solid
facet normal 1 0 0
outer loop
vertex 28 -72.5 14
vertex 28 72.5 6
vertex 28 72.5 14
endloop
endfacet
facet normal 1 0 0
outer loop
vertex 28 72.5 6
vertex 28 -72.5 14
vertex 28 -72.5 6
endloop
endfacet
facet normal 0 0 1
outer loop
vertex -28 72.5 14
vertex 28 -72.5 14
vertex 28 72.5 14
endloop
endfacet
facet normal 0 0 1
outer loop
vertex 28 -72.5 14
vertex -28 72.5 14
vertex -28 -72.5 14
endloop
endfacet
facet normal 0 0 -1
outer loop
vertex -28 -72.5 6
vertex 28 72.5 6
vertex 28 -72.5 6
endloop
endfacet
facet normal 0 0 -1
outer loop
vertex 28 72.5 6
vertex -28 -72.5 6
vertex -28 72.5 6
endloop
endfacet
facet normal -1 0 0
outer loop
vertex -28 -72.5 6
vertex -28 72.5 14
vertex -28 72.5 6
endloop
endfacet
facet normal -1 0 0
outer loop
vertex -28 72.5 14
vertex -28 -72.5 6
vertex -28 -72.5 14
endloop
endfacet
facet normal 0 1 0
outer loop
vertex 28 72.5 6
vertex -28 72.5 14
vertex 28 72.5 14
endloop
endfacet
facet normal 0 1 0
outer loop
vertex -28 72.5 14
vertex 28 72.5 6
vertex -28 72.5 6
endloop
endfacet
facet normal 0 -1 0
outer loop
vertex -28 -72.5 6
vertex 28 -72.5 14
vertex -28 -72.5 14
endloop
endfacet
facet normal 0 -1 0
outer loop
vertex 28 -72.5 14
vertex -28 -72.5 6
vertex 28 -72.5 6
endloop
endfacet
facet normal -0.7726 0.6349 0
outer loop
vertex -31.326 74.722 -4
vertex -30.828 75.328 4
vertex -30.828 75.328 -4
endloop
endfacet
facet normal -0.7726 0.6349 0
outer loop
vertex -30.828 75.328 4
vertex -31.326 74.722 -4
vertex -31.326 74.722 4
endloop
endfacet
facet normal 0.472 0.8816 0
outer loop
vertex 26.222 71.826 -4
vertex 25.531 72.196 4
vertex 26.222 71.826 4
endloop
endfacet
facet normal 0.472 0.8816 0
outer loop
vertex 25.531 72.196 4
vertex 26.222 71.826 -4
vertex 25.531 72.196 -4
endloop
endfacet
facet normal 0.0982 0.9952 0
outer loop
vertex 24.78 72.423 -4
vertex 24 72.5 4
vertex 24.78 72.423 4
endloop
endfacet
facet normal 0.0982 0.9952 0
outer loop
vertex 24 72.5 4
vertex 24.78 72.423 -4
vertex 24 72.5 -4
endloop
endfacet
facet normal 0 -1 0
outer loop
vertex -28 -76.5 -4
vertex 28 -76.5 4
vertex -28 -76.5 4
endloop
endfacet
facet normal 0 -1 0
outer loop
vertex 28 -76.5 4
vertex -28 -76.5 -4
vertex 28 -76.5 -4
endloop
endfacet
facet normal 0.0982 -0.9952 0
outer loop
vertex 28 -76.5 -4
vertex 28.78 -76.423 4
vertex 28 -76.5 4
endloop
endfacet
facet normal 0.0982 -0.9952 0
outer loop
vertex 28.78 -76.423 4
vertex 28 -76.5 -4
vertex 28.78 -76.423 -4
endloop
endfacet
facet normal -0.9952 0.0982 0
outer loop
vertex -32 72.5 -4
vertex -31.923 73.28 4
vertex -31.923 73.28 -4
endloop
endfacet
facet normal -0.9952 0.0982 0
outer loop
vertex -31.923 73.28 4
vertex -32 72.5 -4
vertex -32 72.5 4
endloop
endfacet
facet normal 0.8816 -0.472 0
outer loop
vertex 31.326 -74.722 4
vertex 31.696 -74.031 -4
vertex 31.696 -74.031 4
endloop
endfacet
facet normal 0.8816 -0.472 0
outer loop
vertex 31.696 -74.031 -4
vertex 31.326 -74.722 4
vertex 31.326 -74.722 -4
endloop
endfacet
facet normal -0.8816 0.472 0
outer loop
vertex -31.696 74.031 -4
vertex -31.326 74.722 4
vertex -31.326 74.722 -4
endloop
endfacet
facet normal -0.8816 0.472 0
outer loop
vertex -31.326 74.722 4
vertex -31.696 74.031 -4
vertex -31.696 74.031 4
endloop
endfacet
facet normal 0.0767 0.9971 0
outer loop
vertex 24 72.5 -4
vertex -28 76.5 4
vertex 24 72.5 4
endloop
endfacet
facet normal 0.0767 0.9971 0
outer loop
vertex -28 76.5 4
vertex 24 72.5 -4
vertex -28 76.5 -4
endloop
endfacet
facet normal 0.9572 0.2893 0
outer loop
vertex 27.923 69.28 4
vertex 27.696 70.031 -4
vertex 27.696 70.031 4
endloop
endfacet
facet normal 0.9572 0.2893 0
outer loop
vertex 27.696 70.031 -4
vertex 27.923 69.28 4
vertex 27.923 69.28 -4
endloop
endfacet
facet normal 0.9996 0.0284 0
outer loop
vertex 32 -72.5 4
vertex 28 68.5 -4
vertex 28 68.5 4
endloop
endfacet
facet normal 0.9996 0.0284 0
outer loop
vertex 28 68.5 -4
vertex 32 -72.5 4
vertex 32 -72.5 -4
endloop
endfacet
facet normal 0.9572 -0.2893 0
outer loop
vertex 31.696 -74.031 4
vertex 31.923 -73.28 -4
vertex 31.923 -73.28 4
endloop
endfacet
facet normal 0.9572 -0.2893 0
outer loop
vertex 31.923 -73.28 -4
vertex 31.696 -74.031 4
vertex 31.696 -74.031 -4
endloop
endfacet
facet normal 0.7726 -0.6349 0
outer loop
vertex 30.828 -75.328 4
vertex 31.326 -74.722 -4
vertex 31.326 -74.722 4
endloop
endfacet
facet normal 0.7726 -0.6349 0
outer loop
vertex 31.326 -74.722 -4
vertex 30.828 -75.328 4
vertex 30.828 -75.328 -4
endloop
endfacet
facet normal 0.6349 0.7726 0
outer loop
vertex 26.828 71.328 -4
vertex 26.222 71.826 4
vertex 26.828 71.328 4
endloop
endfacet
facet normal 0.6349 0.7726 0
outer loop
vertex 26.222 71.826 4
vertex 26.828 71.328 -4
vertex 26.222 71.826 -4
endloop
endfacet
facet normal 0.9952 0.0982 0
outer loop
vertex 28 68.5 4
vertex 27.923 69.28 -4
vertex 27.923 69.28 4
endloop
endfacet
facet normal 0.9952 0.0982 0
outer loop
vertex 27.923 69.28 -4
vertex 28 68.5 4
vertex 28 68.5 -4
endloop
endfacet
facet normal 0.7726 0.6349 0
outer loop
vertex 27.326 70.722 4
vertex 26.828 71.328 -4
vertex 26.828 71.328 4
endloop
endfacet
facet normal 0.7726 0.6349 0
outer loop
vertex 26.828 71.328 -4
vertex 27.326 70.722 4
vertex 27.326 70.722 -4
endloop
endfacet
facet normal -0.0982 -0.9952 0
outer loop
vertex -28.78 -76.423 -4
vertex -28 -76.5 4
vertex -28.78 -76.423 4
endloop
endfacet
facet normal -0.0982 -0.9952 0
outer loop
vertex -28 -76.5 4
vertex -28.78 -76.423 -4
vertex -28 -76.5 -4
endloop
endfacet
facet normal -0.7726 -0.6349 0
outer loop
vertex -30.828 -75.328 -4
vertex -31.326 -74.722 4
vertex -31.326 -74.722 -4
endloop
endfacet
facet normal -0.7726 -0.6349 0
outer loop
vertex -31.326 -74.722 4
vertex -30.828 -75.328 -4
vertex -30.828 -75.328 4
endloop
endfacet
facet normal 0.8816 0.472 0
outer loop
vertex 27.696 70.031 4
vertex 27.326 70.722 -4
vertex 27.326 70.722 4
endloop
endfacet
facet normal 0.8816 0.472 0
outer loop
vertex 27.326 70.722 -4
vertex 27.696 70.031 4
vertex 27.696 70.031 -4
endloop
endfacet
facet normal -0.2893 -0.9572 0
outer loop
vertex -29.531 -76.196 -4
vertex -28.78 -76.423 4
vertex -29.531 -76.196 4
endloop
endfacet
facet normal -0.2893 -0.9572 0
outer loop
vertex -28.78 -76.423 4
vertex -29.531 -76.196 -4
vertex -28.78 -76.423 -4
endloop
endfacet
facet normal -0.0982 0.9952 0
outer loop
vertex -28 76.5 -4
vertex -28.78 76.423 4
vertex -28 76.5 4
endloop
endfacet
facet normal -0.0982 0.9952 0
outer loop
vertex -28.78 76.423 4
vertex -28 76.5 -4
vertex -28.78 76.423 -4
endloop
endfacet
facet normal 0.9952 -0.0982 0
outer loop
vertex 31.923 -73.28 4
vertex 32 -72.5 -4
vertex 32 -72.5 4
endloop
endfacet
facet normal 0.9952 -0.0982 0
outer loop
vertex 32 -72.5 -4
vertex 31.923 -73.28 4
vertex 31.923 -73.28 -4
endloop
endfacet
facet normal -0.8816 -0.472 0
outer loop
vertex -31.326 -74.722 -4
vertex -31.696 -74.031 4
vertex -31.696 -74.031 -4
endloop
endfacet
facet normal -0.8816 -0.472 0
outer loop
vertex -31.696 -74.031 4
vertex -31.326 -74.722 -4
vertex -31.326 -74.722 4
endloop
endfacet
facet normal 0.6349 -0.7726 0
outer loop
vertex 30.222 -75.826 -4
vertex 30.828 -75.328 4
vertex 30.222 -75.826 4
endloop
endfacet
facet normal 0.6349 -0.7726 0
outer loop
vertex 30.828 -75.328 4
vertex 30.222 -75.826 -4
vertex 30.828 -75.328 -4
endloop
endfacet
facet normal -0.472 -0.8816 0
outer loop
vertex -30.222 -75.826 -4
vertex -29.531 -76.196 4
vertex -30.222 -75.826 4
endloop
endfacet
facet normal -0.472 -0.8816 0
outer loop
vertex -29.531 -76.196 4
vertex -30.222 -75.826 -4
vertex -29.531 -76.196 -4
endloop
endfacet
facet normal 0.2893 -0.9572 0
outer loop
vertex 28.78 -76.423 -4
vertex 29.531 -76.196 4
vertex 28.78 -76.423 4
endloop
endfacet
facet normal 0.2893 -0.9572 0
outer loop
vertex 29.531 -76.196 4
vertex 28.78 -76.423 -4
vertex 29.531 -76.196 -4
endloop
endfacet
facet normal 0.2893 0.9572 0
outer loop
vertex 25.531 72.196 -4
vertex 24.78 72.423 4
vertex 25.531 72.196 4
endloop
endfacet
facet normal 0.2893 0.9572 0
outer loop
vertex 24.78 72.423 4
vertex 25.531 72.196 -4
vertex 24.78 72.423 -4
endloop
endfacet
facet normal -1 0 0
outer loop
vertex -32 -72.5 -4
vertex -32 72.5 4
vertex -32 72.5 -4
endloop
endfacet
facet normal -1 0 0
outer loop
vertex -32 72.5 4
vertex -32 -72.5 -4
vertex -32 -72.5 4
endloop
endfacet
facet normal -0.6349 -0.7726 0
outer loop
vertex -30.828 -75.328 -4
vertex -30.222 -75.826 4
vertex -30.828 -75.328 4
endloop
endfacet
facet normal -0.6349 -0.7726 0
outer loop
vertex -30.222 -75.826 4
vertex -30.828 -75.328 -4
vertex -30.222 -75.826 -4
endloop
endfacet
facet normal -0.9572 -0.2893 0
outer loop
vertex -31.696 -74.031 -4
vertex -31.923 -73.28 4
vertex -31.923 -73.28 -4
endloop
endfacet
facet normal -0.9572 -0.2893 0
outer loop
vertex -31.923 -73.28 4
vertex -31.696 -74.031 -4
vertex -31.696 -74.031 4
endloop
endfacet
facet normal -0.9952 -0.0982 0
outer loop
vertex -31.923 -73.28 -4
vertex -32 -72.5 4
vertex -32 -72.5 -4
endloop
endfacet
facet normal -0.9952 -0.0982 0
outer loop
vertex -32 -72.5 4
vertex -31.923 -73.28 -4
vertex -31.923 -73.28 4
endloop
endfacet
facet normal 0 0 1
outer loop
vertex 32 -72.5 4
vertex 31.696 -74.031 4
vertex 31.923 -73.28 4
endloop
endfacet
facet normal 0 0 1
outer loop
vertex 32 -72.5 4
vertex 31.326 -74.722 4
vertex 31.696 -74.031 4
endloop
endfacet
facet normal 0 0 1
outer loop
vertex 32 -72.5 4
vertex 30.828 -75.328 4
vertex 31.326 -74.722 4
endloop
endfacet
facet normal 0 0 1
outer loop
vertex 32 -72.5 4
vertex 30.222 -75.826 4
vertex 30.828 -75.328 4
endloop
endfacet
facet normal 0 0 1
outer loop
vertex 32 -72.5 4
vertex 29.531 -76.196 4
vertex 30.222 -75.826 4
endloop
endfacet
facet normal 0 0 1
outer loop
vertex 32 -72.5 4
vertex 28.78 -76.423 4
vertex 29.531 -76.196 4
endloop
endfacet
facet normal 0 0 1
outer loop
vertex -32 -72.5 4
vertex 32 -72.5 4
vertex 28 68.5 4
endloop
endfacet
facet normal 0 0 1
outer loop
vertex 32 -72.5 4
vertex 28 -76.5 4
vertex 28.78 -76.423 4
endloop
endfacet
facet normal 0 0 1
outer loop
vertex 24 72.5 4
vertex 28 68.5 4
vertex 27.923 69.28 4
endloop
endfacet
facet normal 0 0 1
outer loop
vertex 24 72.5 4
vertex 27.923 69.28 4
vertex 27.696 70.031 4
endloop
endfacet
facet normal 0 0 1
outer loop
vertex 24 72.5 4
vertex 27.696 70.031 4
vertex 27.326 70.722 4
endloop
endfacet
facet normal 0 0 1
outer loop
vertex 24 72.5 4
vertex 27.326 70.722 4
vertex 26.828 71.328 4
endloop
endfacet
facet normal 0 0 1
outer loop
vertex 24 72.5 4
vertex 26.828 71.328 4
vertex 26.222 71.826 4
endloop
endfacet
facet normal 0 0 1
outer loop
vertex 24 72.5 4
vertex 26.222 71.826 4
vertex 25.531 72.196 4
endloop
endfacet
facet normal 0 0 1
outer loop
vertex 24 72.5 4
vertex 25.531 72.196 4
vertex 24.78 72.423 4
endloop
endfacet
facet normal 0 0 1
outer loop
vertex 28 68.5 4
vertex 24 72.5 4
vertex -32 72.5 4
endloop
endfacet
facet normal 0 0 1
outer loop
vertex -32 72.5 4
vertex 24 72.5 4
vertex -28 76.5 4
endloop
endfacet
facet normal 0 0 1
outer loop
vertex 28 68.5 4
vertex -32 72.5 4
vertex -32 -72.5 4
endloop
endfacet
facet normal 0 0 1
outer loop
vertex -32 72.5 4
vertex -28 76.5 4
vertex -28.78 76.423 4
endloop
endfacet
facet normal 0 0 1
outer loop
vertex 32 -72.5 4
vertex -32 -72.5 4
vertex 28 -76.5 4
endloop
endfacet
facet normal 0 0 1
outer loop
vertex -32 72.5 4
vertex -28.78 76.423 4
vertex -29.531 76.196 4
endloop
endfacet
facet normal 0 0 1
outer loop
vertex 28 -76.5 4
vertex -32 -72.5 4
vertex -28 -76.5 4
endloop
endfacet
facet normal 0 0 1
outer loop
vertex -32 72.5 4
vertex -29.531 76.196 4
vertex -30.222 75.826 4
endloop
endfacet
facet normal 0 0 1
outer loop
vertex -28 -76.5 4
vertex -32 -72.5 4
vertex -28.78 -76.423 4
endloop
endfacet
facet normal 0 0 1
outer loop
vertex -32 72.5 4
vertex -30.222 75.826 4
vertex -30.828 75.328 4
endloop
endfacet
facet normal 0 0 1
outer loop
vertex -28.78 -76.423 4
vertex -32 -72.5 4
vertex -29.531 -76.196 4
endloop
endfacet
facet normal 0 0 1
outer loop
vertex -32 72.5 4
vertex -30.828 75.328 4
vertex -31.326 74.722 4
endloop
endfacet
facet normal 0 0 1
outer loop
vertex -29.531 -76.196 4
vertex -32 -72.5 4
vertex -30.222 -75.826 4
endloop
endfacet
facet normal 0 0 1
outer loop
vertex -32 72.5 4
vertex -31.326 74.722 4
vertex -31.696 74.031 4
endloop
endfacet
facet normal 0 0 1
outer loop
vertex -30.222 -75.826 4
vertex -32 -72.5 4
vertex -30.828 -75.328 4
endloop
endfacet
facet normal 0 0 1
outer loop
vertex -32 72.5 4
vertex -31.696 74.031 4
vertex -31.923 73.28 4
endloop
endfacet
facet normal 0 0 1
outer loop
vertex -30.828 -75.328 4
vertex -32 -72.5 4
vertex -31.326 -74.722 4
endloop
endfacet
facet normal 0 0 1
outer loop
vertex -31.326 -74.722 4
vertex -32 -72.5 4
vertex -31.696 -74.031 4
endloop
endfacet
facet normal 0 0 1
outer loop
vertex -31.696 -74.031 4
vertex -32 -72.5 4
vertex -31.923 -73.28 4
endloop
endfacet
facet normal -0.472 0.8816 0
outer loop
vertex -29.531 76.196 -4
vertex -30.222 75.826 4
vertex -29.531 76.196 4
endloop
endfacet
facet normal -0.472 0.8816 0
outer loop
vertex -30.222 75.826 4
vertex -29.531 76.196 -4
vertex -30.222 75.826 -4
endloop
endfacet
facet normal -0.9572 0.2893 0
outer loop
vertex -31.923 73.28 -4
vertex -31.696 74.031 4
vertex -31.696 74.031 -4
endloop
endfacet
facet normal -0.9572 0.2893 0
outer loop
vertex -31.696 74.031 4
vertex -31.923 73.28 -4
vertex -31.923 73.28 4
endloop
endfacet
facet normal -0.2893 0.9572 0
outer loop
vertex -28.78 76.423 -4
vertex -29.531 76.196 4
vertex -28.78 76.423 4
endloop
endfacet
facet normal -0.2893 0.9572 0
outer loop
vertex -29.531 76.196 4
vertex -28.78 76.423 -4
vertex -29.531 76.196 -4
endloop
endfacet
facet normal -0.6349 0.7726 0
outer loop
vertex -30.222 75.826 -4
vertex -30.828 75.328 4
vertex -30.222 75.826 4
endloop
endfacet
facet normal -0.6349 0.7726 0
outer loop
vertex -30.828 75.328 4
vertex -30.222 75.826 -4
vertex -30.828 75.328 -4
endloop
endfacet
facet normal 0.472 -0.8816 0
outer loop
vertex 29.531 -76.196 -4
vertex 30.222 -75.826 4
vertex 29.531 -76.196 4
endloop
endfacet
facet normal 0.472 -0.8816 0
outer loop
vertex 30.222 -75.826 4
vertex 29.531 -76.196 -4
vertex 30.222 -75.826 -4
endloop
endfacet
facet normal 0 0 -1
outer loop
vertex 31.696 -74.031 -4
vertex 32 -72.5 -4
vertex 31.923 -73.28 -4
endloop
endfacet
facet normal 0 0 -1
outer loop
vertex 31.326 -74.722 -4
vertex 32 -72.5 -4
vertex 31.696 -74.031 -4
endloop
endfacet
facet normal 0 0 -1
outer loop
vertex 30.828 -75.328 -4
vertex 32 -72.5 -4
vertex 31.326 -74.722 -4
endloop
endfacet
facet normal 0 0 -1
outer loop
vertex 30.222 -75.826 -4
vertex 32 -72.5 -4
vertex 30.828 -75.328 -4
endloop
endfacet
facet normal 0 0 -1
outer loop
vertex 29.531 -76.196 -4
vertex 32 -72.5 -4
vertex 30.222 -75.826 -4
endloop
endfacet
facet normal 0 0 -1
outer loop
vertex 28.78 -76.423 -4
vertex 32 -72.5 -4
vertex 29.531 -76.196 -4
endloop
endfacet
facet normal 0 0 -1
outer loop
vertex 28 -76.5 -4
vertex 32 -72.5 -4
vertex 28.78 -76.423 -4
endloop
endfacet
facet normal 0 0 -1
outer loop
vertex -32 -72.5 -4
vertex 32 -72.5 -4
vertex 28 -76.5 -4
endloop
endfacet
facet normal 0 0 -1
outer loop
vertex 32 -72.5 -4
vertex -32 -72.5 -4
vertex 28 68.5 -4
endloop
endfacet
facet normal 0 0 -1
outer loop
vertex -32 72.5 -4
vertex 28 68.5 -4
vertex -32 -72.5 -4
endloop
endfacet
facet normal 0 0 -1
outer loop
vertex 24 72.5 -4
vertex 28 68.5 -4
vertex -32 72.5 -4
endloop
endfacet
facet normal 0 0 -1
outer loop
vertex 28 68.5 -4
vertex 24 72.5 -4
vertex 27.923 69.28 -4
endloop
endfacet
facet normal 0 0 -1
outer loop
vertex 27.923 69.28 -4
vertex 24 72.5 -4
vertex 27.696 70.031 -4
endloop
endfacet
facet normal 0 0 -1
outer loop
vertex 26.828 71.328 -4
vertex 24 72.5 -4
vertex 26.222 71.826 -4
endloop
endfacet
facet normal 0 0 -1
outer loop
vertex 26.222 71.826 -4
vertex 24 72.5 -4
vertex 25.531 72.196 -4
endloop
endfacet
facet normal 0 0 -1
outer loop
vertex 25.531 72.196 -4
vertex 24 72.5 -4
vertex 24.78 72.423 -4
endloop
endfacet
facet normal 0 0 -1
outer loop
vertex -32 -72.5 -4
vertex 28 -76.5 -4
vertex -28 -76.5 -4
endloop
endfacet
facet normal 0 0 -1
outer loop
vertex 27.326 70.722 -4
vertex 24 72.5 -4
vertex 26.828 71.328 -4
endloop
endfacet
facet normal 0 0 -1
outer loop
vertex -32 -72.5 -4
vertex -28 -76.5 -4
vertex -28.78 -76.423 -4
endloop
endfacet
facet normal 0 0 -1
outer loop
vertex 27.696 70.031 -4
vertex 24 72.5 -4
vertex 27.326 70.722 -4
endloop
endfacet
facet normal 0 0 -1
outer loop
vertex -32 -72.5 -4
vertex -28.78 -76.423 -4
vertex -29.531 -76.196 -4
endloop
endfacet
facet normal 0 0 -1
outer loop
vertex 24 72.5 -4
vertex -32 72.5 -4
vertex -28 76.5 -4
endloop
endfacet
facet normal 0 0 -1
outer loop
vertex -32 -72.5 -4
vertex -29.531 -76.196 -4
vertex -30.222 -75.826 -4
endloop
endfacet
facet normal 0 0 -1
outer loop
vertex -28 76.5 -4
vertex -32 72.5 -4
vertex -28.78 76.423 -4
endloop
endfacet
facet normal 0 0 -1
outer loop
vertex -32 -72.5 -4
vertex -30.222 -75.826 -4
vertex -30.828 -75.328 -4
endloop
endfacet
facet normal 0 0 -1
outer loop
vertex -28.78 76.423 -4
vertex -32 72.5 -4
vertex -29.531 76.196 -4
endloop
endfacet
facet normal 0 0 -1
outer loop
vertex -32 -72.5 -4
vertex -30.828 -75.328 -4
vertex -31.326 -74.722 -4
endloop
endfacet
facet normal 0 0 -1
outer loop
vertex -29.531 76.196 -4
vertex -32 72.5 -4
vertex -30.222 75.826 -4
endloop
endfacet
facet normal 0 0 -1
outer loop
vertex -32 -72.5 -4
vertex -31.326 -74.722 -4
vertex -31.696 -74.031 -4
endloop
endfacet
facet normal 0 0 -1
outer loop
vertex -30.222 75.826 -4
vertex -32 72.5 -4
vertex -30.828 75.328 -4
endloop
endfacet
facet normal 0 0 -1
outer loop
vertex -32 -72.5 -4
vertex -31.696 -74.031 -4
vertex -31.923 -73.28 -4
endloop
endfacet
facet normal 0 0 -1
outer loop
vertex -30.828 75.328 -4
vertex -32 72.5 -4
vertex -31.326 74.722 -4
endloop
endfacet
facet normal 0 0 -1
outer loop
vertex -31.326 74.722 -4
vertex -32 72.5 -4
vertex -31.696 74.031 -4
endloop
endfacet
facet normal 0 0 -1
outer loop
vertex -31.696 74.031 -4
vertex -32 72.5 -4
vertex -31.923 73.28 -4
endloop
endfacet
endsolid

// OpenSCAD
echo("Работа Вадима Разеева!");
len_phone=145;
width_phone=56;
thickness_phone=8;
corner_round=8;

color("red")
translate([0, 0, 10])
cube([width_phone, len_phone, thickness_phone], center=true);

hull() {
    color("red")
    translate([width_phone/2-corner_round/2, len_phone/2-corner_round/2, 0])
    cylinder(h=8, d=corner_round, $fn=32, center=true);

    mirror([1,0,0])
    color("red")
    translate([width_phone/2, len_phone/2, 0])
    cylinder(h=8, d=corner_round, $fn=32, center=true);

    mirror([0,1,0])
    color("red")
    translate([width_phone/2, len_phone/2, 0])
    cylinder(h=8, d=corner_round, $fn=32, center=true);

    mirror([1,0,0])
    mirror([0,1,0])
    color("red")
    translate([width_phone/2, len_phone/2, 0])
    cylinder(h=8, d=corner_round, $fn=32, center=true);
}
